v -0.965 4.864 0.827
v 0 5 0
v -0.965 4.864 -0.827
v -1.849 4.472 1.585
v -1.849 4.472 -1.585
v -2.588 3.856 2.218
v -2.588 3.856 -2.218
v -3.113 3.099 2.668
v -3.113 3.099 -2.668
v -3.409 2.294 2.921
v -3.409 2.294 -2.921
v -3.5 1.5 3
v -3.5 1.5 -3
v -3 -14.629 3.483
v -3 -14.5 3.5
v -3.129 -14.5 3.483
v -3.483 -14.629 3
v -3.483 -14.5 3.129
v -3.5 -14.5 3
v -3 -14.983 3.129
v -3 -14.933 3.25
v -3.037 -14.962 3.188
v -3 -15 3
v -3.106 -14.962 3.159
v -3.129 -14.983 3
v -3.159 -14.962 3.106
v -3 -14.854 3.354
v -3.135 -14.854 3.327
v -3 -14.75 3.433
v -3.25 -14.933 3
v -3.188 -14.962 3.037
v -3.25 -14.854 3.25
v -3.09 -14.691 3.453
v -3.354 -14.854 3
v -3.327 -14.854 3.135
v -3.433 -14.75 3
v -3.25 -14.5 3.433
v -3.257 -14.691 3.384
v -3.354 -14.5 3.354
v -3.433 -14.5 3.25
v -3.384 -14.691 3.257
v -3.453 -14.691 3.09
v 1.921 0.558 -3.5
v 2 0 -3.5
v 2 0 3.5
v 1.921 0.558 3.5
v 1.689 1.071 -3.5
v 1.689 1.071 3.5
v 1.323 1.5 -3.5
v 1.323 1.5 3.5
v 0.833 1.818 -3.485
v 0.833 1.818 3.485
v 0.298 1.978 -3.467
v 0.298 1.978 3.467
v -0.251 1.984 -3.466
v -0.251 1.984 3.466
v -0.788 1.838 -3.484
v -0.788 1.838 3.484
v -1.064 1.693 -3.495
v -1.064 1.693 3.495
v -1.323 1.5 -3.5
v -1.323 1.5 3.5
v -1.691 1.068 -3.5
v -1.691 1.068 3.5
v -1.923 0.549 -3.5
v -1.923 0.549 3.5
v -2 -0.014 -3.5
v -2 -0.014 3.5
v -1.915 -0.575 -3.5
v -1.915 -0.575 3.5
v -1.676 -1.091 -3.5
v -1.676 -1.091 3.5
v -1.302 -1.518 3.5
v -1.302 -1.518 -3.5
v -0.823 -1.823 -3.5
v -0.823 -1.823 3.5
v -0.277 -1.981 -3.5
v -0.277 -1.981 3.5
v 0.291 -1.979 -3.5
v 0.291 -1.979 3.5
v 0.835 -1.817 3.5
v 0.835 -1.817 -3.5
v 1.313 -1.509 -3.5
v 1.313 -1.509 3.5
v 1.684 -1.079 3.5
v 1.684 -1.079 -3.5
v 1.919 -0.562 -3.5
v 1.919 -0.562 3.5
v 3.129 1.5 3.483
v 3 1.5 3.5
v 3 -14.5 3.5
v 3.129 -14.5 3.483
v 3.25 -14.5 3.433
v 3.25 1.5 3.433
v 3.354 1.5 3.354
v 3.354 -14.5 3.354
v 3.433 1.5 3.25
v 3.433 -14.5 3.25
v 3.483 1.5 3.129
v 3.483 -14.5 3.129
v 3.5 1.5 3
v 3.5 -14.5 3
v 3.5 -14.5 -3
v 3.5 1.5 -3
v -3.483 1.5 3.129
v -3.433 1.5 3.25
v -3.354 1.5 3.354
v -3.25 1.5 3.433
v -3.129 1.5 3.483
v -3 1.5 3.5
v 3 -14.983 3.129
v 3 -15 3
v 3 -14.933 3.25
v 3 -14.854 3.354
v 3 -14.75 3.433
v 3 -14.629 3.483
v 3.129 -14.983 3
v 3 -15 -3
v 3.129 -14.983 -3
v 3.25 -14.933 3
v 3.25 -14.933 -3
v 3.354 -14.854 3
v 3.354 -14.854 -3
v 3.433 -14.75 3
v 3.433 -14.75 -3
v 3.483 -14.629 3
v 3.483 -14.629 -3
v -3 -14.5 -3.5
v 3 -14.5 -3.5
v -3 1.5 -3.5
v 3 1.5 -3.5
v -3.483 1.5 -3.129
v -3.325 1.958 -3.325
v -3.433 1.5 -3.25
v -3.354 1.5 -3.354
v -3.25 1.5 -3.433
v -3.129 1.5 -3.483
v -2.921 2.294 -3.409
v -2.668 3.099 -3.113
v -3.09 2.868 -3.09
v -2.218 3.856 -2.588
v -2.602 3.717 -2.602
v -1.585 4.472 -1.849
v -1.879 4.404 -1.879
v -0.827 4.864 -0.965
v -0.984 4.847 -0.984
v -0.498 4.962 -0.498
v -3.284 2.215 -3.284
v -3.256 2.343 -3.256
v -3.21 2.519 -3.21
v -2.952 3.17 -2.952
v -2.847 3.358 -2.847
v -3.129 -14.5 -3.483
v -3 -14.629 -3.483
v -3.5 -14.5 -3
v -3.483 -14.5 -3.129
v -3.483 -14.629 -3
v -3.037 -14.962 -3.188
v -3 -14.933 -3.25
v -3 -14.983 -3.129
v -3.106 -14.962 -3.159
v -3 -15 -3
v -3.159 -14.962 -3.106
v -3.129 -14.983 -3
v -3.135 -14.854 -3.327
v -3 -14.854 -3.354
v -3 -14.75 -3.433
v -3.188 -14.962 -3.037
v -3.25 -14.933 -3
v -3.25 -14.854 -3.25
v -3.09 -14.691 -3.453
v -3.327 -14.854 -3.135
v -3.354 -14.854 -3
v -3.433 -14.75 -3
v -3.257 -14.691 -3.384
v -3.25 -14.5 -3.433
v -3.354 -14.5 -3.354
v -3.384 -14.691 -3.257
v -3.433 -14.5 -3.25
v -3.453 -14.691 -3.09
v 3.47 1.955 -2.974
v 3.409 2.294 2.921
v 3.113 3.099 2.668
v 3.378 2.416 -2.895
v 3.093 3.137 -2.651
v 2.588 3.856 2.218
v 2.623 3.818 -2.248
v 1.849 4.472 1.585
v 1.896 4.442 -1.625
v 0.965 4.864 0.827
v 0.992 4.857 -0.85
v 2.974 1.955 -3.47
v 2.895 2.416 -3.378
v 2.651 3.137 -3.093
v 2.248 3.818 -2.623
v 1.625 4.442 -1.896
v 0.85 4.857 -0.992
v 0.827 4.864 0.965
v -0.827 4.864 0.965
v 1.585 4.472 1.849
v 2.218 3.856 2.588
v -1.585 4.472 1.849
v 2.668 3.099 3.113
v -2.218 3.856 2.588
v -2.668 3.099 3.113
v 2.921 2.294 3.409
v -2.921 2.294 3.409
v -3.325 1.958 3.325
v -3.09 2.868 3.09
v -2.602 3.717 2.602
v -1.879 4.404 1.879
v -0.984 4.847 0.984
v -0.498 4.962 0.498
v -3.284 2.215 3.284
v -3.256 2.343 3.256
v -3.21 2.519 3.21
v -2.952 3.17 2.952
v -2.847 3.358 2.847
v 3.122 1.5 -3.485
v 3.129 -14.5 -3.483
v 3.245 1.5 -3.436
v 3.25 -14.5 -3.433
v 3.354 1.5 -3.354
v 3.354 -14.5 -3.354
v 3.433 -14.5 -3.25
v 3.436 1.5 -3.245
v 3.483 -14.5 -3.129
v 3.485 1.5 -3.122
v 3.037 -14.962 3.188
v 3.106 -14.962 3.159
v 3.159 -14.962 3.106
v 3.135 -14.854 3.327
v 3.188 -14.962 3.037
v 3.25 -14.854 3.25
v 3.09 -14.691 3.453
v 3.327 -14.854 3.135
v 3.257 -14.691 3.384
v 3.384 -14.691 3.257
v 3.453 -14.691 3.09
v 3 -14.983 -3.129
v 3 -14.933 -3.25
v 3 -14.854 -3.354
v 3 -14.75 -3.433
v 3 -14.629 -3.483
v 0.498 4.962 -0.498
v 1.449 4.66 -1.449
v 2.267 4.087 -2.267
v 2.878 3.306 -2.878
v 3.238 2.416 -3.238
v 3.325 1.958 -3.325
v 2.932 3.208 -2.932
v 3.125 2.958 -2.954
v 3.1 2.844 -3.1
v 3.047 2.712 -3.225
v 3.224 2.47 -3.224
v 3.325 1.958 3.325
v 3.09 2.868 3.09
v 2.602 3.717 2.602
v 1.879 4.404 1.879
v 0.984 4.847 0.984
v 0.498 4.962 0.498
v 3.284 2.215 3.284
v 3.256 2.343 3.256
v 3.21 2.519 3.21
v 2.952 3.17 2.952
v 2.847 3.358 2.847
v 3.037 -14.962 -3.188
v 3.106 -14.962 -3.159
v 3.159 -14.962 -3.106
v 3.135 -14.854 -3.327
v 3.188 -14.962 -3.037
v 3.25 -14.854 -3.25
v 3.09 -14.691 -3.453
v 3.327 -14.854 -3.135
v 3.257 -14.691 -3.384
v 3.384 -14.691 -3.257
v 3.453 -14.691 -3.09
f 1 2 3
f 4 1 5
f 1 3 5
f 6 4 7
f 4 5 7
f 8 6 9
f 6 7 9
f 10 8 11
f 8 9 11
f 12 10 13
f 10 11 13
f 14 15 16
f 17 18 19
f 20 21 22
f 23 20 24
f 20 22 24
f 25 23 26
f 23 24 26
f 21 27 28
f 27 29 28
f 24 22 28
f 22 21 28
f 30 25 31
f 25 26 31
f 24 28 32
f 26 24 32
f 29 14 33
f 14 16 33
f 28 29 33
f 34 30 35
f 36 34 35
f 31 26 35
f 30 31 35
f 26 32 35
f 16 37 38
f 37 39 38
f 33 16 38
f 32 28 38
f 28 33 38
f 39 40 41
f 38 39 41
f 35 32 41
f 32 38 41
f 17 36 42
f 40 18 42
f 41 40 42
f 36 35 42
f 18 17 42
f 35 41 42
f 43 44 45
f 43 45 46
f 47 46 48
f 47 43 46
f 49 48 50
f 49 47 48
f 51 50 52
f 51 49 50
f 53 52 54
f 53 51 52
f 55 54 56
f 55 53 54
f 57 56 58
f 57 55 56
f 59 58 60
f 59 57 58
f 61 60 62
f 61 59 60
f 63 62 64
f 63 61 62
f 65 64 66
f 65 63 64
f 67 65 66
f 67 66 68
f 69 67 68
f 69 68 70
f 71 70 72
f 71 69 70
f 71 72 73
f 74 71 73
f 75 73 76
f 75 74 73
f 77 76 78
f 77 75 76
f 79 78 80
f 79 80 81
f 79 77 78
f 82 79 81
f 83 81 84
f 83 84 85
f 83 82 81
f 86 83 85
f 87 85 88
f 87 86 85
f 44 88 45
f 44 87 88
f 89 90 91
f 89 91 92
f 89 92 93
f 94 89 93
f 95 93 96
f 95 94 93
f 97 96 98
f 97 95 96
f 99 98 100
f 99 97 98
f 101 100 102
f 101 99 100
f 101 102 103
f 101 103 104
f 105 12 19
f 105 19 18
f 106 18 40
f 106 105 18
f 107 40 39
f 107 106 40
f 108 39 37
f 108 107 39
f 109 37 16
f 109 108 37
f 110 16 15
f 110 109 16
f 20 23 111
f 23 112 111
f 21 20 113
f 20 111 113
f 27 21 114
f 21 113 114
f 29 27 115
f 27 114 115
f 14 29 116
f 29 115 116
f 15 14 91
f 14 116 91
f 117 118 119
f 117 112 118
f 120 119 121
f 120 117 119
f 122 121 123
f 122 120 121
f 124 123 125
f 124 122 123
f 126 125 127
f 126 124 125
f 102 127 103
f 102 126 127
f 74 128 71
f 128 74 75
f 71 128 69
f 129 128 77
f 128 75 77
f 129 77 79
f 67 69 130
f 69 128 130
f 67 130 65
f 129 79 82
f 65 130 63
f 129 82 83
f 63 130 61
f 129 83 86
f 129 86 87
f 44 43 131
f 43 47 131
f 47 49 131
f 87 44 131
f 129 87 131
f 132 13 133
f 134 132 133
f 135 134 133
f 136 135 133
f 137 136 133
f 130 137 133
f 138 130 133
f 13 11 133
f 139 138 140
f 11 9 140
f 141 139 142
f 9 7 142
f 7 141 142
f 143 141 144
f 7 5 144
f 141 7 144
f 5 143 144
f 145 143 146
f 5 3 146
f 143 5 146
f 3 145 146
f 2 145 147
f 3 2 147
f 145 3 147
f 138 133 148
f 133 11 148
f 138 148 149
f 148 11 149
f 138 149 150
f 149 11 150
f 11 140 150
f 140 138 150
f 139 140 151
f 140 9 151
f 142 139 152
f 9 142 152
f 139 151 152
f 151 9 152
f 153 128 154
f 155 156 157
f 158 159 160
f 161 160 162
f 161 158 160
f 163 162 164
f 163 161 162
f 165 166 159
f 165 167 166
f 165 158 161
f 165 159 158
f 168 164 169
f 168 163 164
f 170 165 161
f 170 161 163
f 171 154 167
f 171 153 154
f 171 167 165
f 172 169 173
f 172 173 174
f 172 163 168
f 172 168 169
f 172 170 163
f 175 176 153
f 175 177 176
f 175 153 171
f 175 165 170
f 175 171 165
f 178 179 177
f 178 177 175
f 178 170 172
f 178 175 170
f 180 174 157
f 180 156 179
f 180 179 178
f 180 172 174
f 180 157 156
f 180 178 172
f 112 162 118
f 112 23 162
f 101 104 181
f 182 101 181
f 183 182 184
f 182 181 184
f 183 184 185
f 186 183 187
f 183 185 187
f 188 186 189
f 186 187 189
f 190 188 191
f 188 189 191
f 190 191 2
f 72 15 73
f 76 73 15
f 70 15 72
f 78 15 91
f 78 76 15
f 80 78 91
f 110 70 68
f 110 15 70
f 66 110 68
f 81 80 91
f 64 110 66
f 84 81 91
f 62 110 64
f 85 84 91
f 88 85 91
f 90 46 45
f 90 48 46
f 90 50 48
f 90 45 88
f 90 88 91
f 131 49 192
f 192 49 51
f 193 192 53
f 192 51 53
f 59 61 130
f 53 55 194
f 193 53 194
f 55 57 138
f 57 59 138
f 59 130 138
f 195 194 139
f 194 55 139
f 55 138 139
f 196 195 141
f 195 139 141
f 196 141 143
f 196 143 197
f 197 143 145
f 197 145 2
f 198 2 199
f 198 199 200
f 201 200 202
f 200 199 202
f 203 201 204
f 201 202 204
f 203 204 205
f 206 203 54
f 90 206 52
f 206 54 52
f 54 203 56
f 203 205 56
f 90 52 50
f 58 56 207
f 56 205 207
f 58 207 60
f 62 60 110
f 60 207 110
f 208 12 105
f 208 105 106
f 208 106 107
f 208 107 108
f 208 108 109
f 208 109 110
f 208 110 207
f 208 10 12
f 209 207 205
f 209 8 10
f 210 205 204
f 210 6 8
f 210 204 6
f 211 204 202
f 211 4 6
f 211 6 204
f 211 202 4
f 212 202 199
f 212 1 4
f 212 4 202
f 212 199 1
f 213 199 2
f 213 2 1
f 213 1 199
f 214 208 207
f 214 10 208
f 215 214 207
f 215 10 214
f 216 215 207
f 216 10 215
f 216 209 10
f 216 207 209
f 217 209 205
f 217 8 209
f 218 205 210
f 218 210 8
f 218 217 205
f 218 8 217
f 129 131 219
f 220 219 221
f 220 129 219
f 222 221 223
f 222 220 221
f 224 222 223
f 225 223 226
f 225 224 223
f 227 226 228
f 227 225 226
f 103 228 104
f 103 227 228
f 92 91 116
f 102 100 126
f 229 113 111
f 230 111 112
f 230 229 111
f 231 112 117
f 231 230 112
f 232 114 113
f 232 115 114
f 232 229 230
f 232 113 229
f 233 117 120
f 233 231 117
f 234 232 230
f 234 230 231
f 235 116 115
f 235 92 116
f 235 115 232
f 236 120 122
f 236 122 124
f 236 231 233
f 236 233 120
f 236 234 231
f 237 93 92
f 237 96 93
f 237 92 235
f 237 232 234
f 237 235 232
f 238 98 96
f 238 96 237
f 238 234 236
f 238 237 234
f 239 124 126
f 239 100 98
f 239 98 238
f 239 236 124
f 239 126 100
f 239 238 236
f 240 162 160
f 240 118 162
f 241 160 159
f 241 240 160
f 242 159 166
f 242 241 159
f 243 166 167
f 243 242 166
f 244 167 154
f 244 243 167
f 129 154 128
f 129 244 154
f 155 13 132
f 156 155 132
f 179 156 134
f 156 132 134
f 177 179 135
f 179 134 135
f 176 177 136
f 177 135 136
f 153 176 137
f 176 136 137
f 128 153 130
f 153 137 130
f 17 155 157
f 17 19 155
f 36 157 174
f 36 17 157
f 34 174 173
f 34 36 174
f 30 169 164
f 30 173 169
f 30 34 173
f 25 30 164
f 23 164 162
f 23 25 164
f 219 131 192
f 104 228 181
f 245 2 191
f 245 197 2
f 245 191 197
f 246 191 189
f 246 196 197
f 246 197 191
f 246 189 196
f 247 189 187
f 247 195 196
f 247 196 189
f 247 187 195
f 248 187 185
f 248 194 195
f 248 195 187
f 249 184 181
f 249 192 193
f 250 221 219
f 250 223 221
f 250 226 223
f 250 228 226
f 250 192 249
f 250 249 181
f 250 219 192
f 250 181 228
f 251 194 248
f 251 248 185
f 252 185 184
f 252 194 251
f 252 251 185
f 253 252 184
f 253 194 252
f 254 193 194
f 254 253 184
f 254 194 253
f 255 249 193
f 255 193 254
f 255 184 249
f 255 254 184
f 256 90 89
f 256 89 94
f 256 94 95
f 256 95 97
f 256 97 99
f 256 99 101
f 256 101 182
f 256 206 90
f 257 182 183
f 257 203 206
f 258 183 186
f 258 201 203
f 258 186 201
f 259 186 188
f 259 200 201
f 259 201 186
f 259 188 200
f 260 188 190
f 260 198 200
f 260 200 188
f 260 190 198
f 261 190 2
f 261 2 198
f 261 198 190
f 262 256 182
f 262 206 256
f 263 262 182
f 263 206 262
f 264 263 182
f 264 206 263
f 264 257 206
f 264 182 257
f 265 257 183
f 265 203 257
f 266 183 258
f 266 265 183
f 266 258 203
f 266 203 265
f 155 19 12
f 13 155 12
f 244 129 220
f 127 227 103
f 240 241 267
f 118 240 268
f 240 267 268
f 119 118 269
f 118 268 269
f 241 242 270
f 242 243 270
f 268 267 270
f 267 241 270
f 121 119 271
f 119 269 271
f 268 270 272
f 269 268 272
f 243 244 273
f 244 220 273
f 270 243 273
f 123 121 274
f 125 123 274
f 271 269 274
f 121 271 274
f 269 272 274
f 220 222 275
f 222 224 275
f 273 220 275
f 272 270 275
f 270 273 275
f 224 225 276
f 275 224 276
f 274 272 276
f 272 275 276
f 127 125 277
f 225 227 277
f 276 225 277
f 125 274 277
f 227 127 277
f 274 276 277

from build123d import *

# Parameters (mm, degrees)
SKETCH1_W           = 7
SKETCH1_H           = 20
SKETCH1_R           = 2
BOSS_EXTRUDE1_DEPTH = 3.5
FILLET1_R           = 3.5
FILLET2_R           = 0.5


with BuildPart() as part:
    # Sketch1 → Boss-Extrude1 (new, symmetric)
    with BuildSketch(Plane.XY):
        with Locations((0, -5)):
            Rectangle(SKETCH1_W, SKETCH1_H)
        Circle(SKETCH1_R, mode=Mode.SUBTRACT)
    extrude(amount=BOSS_EXTRUDE1_DEPTH, both=True)

    # Fillet1
    # the kernel refuses this fillet: 3.5 mm, written as the material it takes off along each edge
    with BuildSketch(Plane(origin=(-12.25, 5, 3.5), x_dir=(0, 0, -1), z_dir=(1, 0, 0)), Plane(origin=(-3.5, 5, -12.25), x_dir=(1, 0, 0), z_dir=(0, 0, 1)), Plane(origin=(3.5, 5, 12.25), x_dir=(-1, 0, 0), z_dir=(0, 0, -1))) as fillet1_piece_1:
        with BuildLine():
            CenterArc((FILLET1_R, -FILLET1_R), FILLET1_R, 90, 90)
            Line((0, -FILLET1_R), (0, 0))
            Line((0, 0), (FILLET1_R, 0))
        make_face()
    extrude(amount=24.5, mode=Mode.SUBTRACT)
    with BuildSketch(Plane(origin=(-12.25, 5, -3.5), x_dir=(0, 0, 1), z_dir=(1, 0, 0))) as fillet1_piece_2:
        with BuildLine():
            CenterArc((FILLET1_R, FILLET1_R), FILLET1_R, 180, 90)
            Line((0, FILLET1_R), (0, 0))
            Line((0, 0), (FILLET1_R, 0))
        make_face()
    extrude(amount=24.5, mode=Mode.SUBTRACT)

    # Fillet2
    fillet2_edges = [part.edges().sort_by_distance(p)[0] for p in [
        (3.5, -6.75, 3.5),
        (-3.5, -6.75, 3.5),
        (-3.5, -6.75, -3.5),
        (-2.261171176, 4.171536059, 2.261171176),
        (-2.261171176, 4.171536059, -2.261171176),
        (2.261171176, 4.171536059, 2.261171176),
        (2.261171176, 4.171536059, -2.261171176),
        (3.5, -6.75, -3.5),
        (0, -15, -3.5),
        (0, -15, 3.5),
        (3.5, -15, 0),
        (-3.5, -15, 0),
    ]]
    fillet(fillet2_edges, radius=FILLET2_R)


solid = part.part
